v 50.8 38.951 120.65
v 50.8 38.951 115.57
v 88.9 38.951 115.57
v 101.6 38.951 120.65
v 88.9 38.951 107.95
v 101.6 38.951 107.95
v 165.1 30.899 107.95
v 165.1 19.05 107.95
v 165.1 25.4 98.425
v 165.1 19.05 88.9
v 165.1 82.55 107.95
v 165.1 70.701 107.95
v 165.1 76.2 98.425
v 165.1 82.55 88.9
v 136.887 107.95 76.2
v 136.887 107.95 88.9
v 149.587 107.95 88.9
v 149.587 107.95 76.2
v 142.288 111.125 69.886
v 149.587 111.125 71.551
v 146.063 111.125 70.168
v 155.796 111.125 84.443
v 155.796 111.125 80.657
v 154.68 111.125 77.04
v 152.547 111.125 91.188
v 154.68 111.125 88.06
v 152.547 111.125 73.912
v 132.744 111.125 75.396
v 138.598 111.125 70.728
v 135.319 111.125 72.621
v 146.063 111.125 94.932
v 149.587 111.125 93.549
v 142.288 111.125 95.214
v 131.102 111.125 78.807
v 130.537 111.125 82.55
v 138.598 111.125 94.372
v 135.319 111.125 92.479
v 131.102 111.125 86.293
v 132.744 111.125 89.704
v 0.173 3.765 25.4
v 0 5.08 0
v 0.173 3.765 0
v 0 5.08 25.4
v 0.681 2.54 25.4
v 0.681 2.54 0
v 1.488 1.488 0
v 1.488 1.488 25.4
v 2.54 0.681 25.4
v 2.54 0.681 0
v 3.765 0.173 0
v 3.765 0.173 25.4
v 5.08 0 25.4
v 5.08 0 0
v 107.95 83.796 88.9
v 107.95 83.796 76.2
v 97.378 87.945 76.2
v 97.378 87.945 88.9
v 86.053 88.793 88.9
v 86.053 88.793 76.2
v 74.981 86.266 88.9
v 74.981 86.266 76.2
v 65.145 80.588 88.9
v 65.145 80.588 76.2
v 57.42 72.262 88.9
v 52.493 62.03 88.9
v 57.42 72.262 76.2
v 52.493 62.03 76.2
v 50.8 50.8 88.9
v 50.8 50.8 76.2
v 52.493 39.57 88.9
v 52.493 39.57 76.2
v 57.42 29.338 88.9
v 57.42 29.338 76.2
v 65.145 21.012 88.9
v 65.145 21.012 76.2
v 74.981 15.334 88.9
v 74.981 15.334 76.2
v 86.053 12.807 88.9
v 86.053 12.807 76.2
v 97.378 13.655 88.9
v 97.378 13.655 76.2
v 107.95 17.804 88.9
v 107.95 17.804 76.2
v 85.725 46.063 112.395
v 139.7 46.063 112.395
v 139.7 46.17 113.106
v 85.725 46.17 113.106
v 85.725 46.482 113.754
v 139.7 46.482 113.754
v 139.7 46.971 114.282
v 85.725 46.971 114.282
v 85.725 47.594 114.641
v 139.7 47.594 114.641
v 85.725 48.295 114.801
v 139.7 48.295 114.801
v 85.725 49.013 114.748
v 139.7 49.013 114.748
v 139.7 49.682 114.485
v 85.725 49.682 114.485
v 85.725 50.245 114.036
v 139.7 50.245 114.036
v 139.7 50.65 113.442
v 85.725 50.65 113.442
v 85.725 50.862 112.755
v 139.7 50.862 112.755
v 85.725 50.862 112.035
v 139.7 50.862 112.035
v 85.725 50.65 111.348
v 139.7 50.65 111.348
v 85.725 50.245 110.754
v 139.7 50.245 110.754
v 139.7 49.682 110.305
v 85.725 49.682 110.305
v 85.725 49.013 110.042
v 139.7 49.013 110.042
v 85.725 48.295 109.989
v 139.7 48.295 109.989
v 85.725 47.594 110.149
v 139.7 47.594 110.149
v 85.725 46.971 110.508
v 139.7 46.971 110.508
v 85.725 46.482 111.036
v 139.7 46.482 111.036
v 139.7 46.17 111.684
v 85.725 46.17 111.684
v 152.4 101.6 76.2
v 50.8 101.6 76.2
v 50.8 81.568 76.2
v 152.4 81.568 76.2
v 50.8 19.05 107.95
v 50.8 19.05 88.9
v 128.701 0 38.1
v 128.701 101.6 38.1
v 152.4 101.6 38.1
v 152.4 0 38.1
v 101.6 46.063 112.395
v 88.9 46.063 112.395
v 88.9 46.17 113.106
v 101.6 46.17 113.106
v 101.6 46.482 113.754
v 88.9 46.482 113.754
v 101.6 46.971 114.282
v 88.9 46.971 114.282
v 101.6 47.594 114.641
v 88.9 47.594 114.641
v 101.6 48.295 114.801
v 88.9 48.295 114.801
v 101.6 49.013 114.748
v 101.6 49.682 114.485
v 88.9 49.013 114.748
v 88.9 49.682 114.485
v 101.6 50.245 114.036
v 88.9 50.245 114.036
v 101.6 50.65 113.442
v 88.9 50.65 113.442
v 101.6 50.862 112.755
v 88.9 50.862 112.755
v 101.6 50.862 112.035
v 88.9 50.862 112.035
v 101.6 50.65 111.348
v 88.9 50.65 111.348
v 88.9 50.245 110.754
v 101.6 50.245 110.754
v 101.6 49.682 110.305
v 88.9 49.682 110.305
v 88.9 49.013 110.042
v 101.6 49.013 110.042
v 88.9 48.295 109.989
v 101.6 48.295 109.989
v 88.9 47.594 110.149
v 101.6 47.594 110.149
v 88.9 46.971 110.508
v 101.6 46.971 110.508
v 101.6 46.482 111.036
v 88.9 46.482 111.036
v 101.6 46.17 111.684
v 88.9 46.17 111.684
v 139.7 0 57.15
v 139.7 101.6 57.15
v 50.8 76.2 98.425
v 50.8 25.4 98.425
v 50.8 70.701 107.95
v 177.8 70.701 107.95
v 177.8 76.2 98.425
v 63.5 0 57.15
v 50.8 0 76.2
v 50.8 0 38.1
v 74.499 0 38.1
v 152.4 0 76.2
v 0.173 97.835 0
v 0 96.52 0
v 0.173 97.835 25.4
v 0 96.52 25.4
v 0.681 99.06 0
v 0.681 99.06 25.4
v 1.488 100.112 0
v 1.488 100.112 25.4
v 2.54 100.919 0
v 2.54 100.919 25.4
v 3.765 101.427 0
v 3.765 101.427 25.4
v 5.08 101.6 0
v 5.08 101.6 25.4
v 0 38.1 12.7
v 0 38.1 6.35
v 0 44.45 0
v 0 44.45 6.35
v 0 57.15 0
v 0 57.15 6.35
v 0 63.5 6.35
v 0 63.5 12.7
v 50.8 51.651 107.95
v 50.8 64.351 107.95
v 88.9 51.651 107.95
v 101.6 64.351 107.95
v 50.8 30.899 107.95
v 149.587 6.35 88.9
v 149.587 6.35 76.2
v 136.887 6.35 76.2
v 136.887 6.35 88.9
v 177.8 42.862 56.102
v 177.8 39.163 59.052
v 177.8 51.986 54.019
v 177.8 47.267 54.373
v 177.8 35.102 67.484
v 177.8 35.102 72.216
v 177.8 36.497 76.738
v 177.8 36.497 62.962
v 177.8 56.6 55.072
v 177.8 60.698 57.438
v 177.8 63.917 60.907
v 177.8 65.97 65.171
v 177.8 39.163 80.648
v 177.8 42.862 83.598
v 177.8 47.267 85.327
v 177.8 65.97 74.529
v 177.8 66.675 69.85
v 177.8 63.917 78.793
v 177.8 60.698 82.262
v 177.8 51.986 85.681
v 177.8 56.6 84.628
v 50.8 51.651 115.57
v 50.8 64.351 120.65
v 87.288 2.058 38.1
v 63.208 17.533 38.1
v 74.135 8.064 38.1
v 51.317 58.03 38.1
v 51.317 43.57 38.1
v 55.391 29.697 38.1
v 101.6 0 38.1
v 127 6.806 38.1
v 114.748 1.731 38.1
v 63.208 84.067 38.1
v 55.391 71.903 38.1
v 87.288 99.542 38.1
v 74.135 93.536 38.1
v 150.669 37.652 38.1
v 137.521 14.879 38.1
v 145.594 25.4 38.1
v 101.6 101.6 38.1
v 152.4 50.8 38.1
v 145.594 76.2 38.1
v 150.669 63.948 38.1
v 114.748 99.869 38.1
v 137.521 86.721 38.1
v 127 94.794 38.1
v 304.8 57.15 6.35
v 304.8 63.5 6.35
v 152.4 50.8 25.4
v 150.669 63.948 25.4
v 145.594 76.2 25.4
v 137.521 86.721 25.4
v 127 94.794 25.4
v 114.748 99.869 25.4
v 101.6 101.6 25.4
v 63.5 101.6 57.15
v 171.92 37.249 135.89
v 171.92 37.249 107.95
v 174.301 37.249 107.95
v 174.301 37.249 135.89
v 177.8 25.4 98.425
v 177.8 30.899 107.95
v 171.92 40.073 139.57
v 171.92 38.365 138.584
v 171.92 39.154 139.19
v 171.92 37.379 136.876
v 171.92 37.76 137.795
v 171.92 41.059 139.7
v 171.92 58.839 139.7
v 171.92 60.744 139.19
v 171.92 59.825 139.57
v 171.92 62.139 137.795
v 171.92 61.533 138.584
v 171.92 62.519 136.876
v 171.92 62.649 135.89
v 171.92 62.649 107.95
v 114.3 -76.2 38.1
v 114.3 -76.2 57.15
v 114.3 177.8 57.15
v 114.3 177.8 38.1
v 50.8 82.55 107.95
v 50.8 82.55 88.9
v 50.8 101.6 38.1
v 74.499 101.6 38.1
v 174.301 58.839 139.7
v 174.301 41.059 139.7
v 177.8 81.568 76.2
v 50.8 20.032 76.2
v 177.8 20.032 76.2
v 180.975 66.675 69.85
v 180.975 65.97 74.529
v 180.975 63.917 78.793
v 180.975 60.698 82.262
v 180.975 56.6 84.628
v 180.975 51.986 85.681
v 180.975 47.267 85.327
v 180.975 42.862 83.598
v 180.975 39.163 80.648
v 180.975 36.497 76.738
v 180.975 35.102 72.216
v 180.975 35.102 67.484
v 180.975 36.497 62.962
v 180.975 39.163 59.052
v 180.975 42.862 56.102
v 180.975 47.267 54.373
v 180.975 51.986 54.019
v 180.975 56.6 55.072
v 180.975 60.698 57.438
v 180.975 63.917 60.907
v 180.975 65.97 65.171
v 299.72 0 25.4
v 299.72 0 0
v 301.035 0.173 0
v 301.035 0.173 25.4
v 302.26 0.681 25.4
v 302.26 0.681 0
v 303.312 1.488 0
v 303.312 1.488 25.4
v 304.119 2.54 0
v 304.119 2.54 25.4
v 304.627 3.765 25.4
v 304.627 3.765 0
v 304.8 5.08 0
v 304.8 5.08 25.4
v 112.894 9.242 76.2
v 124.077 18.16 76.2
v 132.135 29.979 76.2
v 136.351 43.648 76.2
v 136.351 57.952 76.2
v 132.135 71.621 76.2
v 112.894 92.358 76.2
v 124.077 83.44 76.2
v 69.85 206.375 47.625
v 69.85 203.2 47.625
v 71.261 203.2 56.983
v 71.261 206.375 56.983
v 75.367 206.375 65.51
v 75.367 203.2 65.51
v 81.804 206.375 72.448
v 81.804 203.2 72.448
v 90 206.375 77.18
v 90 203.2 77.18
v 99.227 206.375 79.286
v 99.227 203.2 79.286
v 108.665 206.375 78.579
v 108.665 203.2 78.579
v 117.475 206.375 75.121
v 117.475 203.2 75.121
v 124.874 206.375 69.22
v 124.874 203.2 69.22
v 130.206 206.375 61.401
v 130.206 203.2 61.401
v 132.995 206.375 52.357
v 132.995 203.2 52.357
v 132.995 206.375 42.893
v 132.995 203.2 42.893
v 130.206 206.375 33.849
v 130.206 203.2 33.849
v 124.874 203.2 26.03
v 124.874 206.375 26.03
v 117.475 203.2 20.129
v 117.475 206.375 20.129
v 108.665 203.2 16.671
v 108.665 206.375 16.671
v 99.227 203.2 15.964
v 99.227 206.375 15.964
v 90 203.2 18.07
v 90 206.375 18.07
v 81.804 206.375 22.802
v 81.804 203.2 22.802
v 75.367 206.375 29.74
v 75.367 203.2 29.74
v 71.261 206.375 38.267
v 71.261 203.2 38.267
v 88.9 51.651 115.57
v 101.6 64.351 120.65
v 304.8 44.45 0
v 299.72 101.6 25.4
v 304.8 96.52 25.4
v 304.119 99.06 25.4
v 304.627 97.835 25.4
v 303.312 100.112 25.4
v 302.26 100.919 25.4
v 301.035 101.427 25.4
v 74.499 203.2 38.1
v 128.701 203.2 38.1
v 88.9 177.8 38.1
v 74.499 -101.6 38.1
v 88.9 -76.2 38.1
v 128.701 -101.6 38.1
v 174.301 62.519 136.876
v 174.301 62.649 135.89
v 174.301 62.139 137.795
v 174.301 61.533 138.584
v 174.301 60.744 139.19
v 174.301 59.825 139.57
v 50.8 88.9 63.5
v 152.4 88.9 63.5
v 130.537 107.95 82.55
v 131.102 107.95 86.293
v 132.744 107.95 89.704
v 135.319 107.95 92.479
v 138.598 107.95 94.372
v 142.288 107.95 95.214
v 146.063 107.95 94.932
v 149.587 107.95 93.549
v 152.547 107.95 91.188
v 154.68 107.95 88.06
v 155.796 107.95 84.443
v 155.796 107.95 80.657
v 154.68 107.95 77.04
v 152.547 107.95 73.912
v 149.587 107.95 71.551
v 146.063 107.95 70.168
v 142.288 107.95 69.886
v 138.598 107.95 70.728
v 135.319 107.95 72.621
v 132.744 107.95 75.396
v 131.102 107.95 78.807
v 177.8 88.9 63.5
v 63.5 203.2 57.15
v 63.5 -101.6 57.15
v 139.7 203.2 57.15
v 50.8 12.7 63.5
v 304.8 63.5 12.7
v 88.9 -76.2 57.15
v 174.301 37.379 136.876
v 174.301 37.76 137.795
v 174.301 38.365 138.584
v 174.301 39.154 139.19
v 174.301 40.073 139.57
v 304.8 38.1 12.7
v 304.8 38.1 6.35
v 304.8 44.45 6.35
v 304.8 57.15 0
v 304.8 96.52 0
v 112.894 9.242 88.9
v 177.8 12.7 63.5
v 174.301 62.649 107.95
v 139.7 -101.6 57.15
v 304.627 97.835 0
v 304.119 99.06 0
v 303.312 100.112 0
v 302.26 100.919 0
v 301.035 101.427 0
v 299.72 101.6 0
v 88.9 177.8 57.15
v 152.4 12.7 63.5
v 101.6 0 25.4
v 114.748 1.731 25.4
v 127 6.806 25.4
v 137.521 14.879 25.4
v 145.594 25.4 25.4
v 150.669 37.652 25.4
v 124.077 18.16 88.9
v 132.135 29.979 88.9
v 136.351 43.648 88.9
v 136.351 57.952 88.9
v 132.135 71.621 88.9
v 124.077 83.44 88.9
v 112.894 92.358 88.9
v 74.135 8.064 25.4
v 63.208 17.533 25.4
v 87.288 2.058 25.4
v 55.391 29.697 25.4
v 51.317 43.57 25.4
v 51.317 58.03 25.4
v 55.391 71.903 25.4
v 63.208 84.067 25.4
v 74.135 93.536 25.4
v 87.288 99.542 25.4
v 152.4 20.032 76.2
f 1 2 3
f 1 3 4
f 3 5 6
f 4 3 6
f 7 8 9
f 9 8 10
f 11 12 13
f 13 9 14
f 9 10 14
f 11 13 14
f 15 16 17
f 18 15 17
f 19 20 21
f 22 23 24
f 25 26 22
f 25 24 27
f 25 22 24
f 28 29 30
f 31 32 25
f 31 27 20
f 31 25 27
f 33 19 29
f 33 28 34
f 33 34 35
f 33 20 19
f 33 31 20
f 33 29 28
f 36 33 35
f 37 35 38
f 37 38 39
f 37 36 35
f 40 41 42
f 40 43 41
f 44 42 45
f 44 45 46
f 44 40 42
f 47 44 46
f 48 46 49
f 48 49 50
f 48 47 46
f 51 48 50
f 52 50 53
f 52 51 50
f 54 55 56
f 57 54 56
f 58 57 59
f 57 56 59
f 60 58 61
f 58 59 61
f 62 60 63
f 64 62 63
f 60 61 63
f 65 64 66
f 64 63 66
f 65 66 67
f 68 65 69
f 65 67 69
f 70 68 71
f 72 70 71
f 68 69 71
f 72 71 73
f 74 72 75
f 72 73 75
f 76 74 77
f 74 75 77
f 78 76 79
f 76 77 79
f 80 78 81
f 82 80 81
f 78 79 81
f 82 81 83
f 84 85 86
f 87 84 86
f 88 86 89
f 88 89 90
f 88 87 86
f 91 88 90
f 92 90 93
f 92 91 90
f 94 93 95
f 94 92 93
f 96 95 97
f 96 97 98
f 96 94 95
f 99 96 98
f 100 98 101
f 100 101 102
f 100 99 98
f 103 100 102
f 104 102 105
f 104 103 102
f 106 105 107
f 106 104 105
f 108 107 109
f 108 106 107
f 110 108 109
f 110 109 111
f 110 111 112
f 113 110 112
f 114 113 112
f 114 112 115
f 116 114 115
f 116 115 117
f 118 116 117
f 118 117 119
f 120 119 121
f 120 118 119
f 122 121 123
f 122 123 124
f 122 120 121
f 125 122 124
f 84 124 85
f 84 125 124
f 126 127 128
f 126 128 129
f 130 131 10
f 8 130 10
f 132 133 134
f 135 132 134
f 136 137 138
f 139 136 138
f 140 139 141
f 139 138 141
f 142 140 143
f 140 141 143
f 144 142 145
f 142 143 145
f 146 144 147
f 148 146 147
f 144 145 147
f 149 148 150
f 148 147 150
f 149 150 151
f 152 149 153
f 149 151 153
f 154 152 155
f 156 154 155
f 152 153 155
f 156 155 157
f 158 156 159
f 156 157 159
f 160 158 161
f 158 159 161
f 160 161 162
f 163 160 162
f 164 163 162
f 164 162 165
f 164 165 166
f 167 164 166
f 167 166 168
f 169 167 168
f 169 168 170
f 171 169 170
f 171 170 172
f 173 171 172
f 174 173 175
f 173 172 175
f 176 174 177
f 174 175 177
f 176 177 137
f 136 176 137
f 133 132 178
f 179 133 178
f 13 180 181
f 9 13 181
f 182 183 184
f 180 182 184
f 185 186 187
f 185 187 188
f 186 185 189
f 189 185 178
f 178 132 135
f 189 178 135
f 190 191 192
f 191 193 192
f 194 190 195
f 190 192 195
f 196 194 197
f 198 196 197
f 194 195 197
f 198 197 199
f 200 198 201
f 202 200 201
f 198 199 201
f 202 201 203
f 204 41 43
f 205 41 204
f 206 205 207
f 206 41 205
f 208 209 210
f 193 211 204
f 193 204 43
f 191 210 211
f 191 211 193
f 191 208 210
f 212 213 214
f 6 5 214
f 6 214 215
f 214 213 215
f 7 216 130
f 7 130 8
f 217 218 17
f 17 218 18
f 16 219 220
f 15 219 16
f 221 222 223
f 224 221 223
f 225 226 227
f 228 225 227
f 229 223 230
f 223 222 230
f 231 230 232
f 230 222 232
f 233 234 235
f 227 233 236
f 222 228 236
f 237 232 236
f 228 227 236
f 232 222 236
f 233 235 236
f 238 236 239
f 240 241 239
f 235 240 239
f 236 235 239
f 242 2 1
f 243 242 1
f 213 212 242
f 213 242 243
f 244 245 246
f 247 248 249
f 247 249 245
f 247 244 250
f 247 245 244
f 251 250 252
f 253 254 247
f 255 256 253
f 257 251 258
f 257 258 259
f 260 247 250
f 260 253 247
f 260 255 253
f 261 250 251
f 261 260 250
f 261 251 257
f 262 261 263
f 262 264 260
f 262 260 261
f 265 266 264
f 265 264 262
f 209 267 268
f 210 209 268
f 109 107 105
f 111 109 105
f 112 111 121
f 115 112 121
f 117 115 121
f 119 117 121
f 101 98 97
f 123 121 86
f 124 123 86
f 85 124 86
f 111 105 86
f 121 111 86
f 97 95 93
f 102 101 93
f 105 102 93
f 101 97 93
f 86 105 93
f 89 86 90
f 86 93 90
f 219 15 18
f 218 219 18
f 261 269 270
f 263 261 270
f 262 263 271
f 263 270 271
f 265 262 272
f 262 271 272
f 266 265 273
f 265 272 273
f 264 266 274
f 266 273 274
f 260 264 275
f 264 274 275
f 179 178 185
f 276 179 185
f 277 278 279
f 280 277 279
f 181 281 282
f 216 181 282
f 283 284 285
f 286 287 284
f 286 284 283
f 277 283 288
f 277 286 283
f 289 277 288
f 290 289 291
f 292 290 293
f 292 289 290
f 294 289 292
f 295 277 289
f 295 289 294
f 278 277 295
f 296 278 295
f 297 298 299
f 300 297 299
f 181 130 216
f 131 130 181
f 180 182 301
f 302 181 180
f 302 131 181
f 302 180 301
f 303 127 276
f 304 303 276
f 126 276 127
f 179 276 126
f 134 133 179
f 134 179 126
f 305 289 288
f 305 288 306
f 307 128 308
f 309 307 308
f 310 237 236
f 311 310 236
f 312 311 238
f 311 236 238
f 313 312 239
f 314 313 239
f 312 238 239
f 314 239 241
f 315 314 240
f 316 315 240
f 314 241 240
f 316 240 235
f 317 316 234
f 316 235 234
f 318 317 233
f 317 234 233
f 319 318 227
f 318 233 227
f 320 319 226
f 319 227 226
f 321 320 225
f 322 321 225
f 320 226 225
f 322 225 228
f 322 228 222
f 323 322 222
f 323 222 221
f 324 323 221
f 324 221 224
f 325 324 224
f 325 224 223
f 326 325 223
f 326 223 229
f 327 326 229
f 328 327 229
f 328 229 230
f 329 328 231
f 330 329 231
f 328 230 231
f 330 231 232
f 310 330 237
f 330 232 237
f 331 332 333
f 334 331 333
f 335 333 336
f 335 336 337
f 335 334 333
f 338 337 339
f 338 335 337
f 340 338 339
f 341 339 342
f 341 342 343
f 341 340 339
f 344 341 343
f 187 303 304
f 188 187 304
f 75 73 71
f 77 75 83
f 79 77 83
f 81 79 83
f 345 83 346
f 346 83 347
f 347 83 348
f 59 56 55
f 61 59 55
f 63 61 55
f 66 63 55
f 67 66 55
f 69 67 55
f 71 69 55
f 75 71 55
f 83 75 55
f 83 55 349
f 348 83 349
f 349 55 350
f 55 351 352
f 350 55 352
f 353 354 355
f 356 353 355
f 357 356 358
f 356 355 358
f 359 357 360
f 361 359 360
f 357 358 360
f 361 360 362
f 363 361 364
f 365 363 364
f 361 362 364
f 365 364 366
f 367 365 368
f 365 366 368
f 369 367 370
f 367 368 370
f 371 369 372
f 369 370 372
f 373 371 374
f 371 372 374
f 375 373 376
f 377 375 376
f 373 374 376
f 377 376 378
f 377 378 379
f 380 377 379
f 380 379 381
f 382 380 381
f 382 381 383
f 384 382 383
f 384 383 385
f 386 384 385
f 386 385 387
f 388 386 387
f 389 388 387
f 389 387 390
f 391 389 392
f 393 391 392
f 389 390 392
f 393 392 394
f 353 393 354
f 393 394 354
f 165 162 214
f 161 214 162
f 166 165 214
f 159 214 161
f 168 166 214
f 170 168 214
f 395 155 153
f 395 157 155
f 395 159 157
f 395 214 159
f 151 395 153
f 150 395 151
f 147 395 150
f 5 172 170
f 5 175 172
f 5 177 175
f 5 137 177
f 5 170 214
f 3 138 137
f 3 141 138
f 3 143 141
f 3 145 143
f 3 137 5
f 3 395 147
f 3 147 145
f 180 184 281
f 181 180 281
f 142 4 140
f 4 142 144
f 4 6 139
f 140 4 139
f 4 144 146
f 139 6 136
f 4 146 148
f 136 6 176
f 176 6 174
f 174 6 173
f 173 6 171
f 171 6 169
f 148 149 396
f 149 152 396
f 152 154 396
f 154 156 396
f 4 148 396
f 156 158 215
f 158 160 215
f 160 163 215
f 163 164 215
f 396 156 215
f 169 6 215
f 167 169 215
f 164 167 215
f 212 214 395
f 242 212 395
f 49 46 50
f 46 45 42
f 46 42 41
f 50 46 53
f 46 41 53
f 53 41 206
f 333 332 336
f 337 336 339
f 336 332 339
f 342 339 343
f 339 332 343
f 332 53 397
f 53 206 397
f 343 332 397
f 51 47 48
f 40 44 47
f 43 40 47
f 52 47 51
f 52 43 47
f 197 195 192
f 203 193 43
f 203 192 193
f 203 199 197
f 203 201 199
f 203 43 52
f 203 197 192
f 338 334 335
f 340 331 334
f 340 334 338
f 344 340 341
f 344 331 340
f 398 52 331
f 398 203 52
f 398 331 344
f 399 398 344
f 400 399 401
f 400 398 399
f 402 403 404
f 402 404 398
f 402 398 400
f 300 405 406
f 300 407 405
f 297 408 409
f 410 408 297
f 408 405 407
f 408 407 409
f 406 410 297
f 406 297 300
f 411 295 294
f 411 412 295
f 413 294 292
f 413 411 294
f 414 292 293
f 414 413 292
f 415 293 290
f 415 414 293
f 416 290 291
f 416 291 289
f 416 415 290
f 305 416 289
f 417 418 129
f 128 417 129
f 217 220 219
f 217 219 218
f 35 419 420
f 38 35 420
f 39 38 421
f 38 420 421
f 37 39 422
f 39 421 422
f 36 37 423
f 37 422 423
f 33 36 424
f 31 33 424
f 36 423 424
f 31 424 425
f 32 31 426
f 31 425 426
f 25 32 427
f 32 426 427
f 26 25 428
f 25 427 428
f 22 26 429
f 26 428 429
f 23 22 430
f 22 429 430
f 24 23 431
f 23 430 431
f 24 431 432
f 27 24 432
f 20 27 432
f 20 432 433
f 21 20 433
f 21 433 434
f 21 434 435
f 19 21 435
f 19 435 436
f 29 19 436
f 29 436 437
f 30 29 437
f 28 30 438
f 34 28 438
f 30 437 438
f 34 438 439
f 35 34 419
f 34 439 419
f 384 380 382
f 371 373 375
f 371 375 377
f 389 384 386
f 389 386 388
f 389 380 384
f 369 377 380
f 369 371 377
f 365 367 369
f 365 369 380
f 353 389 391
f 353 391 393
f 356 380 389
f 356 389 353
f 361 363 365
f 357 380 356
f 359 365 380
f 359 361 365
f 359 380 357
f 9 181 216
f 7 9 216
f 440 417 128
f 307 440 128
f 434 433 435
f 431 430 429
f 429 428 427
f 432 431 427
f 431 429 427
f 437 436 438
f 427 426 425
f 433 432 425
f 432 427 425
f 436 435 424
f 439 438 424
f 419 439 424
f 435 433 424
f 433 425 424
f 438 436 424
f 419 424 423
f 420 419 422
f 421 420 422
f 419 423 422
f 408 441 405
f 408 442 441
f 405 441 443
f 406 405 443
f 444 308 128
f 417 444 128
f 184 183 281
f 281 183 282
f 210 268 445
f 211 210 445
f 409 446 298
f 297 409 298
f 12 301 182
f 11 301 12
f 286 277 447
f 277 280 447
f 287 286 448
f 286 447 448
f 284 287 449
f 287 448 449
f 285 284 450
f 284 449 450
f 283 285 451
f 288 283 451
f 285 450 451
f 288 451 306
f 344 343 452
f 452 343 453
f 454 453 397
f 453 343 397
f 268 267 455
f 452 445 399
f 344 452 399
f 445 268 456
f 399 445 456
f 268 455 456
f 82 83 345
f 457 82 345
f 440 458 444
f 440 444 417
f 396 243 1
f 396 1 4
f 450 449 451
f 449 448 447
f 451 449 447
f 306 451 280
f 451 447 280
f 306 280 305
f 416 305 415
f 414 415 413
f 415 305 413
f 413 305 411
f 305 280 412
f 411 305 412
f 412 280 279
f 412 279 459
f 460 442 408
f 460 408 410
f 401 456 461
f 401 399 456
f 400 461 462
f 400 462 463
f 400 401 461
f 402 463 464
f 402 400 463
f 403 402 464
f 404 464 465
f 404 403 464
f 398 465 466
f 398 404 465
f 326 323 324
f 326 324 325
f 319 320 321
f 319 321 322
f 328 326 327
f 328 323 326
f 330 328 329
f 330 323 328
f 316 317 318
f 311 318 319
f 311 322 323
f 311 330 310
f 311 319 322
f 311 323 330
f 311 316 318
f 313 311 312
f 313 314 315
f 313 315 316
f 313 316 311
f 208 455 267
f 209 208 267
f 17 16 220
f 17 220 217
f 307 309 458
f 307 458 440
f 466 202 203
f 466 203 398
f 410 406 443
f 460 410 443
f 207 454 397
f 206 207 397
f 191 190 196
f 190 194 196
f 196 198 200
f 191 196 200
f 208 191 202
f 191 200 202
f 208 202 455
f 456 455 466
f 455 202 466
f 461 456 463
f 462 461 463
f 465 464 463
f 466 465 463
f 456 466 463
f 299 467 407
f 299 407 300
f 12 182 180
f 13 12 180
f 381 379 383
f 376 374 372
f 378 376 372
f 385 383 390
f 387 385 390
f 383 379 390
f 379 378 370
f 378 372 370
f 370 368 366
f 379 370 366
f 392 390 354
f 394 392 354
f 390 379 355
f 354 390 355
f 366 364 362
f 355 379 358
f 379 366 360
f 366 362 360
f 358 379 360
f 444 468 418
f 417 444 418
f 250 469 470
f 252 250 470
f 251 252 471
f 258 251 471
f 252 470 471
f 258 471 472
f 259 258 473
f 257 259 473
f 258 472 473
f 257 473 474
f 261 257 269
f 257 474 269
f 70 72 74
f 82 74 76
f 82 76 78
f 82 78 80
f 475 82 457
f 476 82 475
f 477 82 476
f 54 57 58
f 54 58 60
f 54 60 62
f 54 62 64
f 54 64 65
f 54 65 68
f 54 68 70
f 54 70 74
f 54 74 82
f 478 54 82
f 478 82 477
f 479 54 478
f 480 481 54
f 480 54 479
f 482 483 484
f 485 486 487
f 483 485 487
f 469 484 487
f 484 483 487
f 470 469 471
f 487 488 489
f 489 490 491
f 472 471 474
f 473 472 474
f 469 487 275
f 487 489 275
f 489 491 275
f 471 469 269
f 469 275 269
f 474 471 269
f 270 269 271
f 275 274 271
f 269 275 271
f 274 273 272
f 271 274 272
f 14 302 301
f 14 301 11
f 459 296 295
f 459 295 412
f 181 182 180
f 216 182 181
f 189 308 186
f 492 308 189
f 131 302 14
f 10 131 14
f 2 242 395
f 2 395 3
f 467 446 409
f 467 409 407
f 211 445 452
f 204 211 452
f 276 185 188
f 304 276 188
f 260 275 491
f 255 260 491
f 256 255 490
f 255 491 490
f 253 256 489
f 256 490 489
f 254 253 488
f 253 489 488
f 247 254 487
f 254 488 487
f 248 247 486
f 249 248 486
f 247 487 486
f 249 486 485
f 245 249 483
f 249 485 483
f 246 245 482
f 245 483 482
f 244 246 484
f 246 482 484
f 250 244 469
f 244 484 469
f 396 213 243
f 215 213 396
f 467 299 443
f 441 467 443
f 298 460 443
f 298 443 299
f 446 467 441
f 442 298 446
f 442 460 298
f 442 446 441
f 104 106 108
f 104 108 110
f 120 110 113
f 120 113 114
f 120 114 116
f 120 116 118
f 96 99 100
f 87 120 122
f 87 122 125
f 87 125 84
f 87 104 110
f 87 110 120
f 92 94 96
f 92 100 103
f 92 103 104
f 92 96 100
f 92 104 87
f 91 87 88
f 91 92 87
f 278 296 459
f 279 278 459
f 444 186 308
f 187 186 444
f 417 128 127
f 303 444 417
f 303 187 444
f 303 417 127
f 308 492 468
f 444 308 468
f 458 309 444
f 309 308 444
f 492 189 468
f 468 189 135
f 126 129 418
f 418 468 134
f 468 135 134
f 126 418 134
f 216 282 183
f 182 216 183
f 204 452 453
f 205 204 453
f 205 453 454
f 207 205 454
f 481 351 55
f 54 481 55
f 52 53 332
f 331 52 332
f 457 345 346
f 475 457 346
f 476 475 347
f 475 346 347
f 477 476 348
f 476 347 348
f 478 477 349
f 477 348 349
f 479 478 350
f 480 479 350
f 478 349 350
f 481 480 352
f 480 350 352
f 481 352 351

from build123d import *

# Parameters (mm, degrees)
F0_W           = 304.8
F0_H           = 101.6
F1_DEPTH       = 25.4
F2_R           = 5.08
F4_DEPTH       = 304.801
F6_DEPTH       = 12.7
F7_W           = 101.6
F7_H           = 101.6
F8_DEPTH       = 38.1
F10_DEPTH      = 101.6
F12_DEPTH      = 101.6
F13_DEPTH      = 101.6
F14_DEPTH      = 203.2
F15_W          = 25.4
F15_H          = 254
F16_DEPTH      = 19.05
F17_R          = 31.75
F18_DEPTH      = 3.175
F19_DEPTH      = 101.6
F19_DEPTH_BACK = 25.4
F20_R          = 15.875
F21_DEPTH      = 3.175
F23_DEPTH      = 12.7
F24_W          = 12.7
F24_H          = 101.6
F25_DEPTH      = 12.7
F26_R          = 12.7
F27_DEPTH      = 3.175
F28_W          = 114.3
F28_H          = 63.5
F29_DEPTH      = 19.05
F31_DEPTH      = 114.3
F32_DEPTH      = 127
F33_W          = 50.8
F33_H          = 25.4
F34_DEPTH      = 12.7
F35_W          = 12.7
F35_H          = 7.62
F36_DEPTH      = 38.1
F37_R          = 2.413
F38_DEPTH      = 12.7
F39_DEPTH      = 3.175
F39_DEPTH_BACK = 50.8
F40_W          = 2.38125
F40_H          = 25.4
F41_DEPTH      = 31.75
F42_R          = 3.81


with BuildPart() as f1:
    # F0 (on Top) → F1 (new body)
    with BuildSketch(Plane.XY):
        with Locations((152.4, 50.8)):
            Rectangle(F0_W, F0_H)
    extrude(amount=F1_DEPTH)

    # F2
    f2_edges = [f1.edges().sort_by_distance(p)[0] for p in [
        (0, 0, 12.7),
        (304.8, 0, 12.7),
        (304.8, 101.6, 12.7),
        (0, 101.6, 12.7),
    ]]
    fillet(f2_edges, radius=F2_R)

    # F3 (on face) → F4 (cut, through all)
    with BuildSketch(Plane.YZ.offset(304.8)):
        Polygon((44.45, 6.35), (44.45, 0), (57.15, 0), (57.15, 6.35), (63.5, 6.35), (63.5, 12.7), (38.1, 12.7), (38.1, 6.35), align=None)
    extrude(amount=-F4_DEPTH, mode=Mode.SUBTRACT)


with BuildPart() as f6:
    # F5 (on face) → F6 (new body)
    with BuildSketch(Plane.XY.offset(25.4)):
        with BuildLine():
            ThreePointArc((101.6, 0), (137.5210244843, 14.8789755157), (152.4, 50.8))
            ThreePointArc((152.4, 50.8), (137.5210244843, 86.7210244843), (101.6, 101.6))
            ThreePointArc((101.6, 101.6), (50.8, 50.8), (101.6, 0))
        make_face()
    extrude(amount=F6_DEPTH)


with BuildPart() as f8:
    # F7 (on face) → F8 (new body)
    with BuildSketch(Plane.XY.offset(38.1)):
        with Locations((101.6, 50.8)):
            Rectangle(F7_W, F7_H)
    extrude(amount=F8_DEPTH)

    # F9 (on face) → F10 (cut, through all)
    with BuildSketch(Plane.XZ):
        Polygon((63.5, 57.15), (74.4985226281, 38.1), (128.7014773719, 38.1), (139.7, 57.15), align=None)
    extrude(amount=-F10_DEPTH, mode=Mode.SUBTRACT)

    # F11 (on face) → F12 (cut, through all)
    with BuildSketch(Plane.YZ.offset(152.4)):
        Polygon((81.5676515813, 76.2), (20.0323484187, 76.2), (12.7, 63.5), (88.9, 63.5), align=None)
    extrude(amount=-F12_DEPTH, mode=Mode.SUBTRACT)


with BuildPart() as f13:
    # F9 (on face) → F13 (new body)
    with BuildSketch(Plane.XZ):
        Polygon((63.5, 57.15), (74.4985226281, 38.1), (128.7014773719, 38.1), (139.7, 57.15), align=None)
    extrude(amount=F13_DEPTH)

    # F9 (on face) → F14 (join)
    with BuildSketch(Plane.XZ):
        Polygon((63.5, 57.15), (74.4985226281, 38.1), (128.7014773719, 38.1), (139.7, 57.15), align=None)
    extrude(amount=-F14_DEPTH)

    # F15 (on face) → F16 (cut, through all)
    with BuildSketch(Plane.XY.offset(57.15)):
        with Locations((101.6, 50.8)):
            Rectangle(F15_W, F15_H)
    extrude(amount=-F16_DEPTH, mode=Mode.SUBTRACT)


with BuildPart() as f18:
    # F17 (on face) → F18 (new body)
    with BuildSketch(Plane(origin=(0, 203.2, 0), x_dir=(-1, 0, 0), z_dir=(0, 1, 0))):
        with Locations((-101.6, 47.625)):
            Circle(F17_R)
    extrude(amount=F18_DEPTH)


with BuildPart() as f19:
    # F11 (on face) → F19 (new body, two sides)
    with BuildSketch(Plane.YZ.offset(152.4)) as f19_sk:
        Polygon((81.5676515813, 76.2), (20.0323484187, 76.2), (12.7, 63.5), (88.9, 63.5), align=None)
    extrude(amount=-F19_DEPTH)
    extrude(f19_sk.sketch, amount=F19_DEPTH_BACK)


with BuildPart() as f21:
    # F20 (on face) → F21 (new body)
    with BuildSketch(Plane.YZ.offset(177.8)):
        with Locations((50.8, 69.85)):
            Circle(F20_R)
    extrude(amount=F21_DEPTH)


with BuildPart() as f23:
    # F22 (on face) → F23 (new body)
    with BuildSketch(Plane.XY.offset(76.2)):
        with BuildLine():
            Line((112.893734675, 92.3583675204), (107.95, 83.7955678842))
            ThreePointArc((107.95, 83.7955678842), (50.8, 50.8), (107.95, 17.8044321158))
            Line((107.95, 17.8044321158), (112.893734675, 9.2416324796))
            ThreePointArc((112.893734675, 9.2416324796), (136.8874693499, 50.8), (112.893734675, 92.3583675204))
        make_face()
    extrude(amount=F23_DEPTH)


with BuildPart() as f25:
    # F24 (on face) → F25 (new body)
    with BuildSketch(Plane.XY.offset(76.2)):
        with Locations((143.2374693499, 57.15)):
            Rectangle(F24_W, F24_H)
    extrude(amount=F25_DEPTH)


with BuildPart() as f27:
    # F26 (on face) → F27 (new body)
    with BuildSketch(Plane(origin=(0, 107.95, 0), x_dir=(-1, 0, 0), z_dir=(0, 1, 0))):
        with Locations((-143.2374693499, 82.55)):
            Circle(F26_R)
    extrude(amount=F27_DEPTH)


with BuildPart() as f29:
    # F28 (on face) → F29 (new body)
    with BuildSketch(Plane.XY.offset(88.9)):
        with Locations((107.95, 50.8)):
            Rectangle(F28_W, F28_H)
    extrude(amount=F29_DEPTH)

    # F30 (on face) → F31 (cut, through all)
    with BuildSketch(Plane(origin=(50.8, 0, 0), x_dir=(0, -1, 0), z_dir=(-1, 0, 0))):
        Polygon((-30.899261314, 107.95), (-70.700738686, 107.95), (-76.2, 98.425), (-25.4, 98.425), align=None)
    extrude(amount=-F31_DEPTH, mode=Mode.SUBTRACT)


with BuildPart() as f32:
    # F30 (on face) → F32 (new body)
    with BuildSketch(Plane(origin=(50.8, 0, 0), x_dir=(0, -1, 0), z_dir=(-1, 0, 0))):
        Polygon((-30.899261314, 107.95), (-70.700738686, 107.95), (-76.2, 98.425), (-25.4, 98.425), align=None)
    extrude(amount=-F32_DEPTH)


with BuildPart() as f34:
    # F33 (on face) → F34 (new body)
    with BuildSketch(Plane.XY.offset(107.95)):
        with Locations((76.2, 51.650738686)):
            Rectangle(F33_W, F33_H)
    extrude(amount=F34_DEPTH)

    # F35 (on face) → F36 (cut)
    with BuildSketch(Plane(origin=(50.8, 0, 0), x_dir=(0, -1, 0), z_dir=(-1, 0, 0))):
        with Locations((-45.300738686, 111.76)):
            Rectangle(F35_W, F35_H)
    extrude(amount=-F36_DEPTH, mode=Mode.SUBTRACT)

    # F37 (on face) → F38 (cut, through all)
    with BuildSketch(Plane(origin=(88.9, 0, 0), x_dir=(0, -1, 0), z_dir=(-1, 0, 0))):
        with Locations((-48.475738686, 112.395)):
            Circle(F37_R)
    extrude(amount=-F38_DEPTH, mode=Mode.SUBTRACT)


with BuildPart() as f39:
    # F37 (on face) → F39 (new body, two sides)
    with BuildSketch(Plane(origin=(88.9, 0, 0), x_dir=(0, -1, 0), z_dir=(-1, 0, 0))) as f39_sk:
        with Locations((-48.475738686, 112.395)):
            Circle(F37_R)
    extrude(amount=F39_DEPTH)
    extrude(f39_sk.sketch, amount=-F39_DEPTH_BACK)


with BuildPart() as f41:
    # F40 (on face) → F41 (new body)
    with BuildSketch(Plane.XY.offset(107.95)):
        with Locations((173.1103308957, 49.949261314)):
            Rectangle(F40_W, F40_H)
    extrude(amount=F41_DEPTH)

    # F42
    f42_edges = [f41.edges().sort_by_distance(p)[0] for p in [
        (173.110331, 37.249261, 139.7),
        (173.110331, 62.649261, 139.7),
    ]]
    fillet(f42_edges, radius=F42_R)


solid = Compound([f1.part, f6.part, f8.part, f13.part, f18.part, f19.part, f21.part, f23.part, f25.part, f27.part, f29.part, f32.part, f34.part, f39.part, f41.part])
